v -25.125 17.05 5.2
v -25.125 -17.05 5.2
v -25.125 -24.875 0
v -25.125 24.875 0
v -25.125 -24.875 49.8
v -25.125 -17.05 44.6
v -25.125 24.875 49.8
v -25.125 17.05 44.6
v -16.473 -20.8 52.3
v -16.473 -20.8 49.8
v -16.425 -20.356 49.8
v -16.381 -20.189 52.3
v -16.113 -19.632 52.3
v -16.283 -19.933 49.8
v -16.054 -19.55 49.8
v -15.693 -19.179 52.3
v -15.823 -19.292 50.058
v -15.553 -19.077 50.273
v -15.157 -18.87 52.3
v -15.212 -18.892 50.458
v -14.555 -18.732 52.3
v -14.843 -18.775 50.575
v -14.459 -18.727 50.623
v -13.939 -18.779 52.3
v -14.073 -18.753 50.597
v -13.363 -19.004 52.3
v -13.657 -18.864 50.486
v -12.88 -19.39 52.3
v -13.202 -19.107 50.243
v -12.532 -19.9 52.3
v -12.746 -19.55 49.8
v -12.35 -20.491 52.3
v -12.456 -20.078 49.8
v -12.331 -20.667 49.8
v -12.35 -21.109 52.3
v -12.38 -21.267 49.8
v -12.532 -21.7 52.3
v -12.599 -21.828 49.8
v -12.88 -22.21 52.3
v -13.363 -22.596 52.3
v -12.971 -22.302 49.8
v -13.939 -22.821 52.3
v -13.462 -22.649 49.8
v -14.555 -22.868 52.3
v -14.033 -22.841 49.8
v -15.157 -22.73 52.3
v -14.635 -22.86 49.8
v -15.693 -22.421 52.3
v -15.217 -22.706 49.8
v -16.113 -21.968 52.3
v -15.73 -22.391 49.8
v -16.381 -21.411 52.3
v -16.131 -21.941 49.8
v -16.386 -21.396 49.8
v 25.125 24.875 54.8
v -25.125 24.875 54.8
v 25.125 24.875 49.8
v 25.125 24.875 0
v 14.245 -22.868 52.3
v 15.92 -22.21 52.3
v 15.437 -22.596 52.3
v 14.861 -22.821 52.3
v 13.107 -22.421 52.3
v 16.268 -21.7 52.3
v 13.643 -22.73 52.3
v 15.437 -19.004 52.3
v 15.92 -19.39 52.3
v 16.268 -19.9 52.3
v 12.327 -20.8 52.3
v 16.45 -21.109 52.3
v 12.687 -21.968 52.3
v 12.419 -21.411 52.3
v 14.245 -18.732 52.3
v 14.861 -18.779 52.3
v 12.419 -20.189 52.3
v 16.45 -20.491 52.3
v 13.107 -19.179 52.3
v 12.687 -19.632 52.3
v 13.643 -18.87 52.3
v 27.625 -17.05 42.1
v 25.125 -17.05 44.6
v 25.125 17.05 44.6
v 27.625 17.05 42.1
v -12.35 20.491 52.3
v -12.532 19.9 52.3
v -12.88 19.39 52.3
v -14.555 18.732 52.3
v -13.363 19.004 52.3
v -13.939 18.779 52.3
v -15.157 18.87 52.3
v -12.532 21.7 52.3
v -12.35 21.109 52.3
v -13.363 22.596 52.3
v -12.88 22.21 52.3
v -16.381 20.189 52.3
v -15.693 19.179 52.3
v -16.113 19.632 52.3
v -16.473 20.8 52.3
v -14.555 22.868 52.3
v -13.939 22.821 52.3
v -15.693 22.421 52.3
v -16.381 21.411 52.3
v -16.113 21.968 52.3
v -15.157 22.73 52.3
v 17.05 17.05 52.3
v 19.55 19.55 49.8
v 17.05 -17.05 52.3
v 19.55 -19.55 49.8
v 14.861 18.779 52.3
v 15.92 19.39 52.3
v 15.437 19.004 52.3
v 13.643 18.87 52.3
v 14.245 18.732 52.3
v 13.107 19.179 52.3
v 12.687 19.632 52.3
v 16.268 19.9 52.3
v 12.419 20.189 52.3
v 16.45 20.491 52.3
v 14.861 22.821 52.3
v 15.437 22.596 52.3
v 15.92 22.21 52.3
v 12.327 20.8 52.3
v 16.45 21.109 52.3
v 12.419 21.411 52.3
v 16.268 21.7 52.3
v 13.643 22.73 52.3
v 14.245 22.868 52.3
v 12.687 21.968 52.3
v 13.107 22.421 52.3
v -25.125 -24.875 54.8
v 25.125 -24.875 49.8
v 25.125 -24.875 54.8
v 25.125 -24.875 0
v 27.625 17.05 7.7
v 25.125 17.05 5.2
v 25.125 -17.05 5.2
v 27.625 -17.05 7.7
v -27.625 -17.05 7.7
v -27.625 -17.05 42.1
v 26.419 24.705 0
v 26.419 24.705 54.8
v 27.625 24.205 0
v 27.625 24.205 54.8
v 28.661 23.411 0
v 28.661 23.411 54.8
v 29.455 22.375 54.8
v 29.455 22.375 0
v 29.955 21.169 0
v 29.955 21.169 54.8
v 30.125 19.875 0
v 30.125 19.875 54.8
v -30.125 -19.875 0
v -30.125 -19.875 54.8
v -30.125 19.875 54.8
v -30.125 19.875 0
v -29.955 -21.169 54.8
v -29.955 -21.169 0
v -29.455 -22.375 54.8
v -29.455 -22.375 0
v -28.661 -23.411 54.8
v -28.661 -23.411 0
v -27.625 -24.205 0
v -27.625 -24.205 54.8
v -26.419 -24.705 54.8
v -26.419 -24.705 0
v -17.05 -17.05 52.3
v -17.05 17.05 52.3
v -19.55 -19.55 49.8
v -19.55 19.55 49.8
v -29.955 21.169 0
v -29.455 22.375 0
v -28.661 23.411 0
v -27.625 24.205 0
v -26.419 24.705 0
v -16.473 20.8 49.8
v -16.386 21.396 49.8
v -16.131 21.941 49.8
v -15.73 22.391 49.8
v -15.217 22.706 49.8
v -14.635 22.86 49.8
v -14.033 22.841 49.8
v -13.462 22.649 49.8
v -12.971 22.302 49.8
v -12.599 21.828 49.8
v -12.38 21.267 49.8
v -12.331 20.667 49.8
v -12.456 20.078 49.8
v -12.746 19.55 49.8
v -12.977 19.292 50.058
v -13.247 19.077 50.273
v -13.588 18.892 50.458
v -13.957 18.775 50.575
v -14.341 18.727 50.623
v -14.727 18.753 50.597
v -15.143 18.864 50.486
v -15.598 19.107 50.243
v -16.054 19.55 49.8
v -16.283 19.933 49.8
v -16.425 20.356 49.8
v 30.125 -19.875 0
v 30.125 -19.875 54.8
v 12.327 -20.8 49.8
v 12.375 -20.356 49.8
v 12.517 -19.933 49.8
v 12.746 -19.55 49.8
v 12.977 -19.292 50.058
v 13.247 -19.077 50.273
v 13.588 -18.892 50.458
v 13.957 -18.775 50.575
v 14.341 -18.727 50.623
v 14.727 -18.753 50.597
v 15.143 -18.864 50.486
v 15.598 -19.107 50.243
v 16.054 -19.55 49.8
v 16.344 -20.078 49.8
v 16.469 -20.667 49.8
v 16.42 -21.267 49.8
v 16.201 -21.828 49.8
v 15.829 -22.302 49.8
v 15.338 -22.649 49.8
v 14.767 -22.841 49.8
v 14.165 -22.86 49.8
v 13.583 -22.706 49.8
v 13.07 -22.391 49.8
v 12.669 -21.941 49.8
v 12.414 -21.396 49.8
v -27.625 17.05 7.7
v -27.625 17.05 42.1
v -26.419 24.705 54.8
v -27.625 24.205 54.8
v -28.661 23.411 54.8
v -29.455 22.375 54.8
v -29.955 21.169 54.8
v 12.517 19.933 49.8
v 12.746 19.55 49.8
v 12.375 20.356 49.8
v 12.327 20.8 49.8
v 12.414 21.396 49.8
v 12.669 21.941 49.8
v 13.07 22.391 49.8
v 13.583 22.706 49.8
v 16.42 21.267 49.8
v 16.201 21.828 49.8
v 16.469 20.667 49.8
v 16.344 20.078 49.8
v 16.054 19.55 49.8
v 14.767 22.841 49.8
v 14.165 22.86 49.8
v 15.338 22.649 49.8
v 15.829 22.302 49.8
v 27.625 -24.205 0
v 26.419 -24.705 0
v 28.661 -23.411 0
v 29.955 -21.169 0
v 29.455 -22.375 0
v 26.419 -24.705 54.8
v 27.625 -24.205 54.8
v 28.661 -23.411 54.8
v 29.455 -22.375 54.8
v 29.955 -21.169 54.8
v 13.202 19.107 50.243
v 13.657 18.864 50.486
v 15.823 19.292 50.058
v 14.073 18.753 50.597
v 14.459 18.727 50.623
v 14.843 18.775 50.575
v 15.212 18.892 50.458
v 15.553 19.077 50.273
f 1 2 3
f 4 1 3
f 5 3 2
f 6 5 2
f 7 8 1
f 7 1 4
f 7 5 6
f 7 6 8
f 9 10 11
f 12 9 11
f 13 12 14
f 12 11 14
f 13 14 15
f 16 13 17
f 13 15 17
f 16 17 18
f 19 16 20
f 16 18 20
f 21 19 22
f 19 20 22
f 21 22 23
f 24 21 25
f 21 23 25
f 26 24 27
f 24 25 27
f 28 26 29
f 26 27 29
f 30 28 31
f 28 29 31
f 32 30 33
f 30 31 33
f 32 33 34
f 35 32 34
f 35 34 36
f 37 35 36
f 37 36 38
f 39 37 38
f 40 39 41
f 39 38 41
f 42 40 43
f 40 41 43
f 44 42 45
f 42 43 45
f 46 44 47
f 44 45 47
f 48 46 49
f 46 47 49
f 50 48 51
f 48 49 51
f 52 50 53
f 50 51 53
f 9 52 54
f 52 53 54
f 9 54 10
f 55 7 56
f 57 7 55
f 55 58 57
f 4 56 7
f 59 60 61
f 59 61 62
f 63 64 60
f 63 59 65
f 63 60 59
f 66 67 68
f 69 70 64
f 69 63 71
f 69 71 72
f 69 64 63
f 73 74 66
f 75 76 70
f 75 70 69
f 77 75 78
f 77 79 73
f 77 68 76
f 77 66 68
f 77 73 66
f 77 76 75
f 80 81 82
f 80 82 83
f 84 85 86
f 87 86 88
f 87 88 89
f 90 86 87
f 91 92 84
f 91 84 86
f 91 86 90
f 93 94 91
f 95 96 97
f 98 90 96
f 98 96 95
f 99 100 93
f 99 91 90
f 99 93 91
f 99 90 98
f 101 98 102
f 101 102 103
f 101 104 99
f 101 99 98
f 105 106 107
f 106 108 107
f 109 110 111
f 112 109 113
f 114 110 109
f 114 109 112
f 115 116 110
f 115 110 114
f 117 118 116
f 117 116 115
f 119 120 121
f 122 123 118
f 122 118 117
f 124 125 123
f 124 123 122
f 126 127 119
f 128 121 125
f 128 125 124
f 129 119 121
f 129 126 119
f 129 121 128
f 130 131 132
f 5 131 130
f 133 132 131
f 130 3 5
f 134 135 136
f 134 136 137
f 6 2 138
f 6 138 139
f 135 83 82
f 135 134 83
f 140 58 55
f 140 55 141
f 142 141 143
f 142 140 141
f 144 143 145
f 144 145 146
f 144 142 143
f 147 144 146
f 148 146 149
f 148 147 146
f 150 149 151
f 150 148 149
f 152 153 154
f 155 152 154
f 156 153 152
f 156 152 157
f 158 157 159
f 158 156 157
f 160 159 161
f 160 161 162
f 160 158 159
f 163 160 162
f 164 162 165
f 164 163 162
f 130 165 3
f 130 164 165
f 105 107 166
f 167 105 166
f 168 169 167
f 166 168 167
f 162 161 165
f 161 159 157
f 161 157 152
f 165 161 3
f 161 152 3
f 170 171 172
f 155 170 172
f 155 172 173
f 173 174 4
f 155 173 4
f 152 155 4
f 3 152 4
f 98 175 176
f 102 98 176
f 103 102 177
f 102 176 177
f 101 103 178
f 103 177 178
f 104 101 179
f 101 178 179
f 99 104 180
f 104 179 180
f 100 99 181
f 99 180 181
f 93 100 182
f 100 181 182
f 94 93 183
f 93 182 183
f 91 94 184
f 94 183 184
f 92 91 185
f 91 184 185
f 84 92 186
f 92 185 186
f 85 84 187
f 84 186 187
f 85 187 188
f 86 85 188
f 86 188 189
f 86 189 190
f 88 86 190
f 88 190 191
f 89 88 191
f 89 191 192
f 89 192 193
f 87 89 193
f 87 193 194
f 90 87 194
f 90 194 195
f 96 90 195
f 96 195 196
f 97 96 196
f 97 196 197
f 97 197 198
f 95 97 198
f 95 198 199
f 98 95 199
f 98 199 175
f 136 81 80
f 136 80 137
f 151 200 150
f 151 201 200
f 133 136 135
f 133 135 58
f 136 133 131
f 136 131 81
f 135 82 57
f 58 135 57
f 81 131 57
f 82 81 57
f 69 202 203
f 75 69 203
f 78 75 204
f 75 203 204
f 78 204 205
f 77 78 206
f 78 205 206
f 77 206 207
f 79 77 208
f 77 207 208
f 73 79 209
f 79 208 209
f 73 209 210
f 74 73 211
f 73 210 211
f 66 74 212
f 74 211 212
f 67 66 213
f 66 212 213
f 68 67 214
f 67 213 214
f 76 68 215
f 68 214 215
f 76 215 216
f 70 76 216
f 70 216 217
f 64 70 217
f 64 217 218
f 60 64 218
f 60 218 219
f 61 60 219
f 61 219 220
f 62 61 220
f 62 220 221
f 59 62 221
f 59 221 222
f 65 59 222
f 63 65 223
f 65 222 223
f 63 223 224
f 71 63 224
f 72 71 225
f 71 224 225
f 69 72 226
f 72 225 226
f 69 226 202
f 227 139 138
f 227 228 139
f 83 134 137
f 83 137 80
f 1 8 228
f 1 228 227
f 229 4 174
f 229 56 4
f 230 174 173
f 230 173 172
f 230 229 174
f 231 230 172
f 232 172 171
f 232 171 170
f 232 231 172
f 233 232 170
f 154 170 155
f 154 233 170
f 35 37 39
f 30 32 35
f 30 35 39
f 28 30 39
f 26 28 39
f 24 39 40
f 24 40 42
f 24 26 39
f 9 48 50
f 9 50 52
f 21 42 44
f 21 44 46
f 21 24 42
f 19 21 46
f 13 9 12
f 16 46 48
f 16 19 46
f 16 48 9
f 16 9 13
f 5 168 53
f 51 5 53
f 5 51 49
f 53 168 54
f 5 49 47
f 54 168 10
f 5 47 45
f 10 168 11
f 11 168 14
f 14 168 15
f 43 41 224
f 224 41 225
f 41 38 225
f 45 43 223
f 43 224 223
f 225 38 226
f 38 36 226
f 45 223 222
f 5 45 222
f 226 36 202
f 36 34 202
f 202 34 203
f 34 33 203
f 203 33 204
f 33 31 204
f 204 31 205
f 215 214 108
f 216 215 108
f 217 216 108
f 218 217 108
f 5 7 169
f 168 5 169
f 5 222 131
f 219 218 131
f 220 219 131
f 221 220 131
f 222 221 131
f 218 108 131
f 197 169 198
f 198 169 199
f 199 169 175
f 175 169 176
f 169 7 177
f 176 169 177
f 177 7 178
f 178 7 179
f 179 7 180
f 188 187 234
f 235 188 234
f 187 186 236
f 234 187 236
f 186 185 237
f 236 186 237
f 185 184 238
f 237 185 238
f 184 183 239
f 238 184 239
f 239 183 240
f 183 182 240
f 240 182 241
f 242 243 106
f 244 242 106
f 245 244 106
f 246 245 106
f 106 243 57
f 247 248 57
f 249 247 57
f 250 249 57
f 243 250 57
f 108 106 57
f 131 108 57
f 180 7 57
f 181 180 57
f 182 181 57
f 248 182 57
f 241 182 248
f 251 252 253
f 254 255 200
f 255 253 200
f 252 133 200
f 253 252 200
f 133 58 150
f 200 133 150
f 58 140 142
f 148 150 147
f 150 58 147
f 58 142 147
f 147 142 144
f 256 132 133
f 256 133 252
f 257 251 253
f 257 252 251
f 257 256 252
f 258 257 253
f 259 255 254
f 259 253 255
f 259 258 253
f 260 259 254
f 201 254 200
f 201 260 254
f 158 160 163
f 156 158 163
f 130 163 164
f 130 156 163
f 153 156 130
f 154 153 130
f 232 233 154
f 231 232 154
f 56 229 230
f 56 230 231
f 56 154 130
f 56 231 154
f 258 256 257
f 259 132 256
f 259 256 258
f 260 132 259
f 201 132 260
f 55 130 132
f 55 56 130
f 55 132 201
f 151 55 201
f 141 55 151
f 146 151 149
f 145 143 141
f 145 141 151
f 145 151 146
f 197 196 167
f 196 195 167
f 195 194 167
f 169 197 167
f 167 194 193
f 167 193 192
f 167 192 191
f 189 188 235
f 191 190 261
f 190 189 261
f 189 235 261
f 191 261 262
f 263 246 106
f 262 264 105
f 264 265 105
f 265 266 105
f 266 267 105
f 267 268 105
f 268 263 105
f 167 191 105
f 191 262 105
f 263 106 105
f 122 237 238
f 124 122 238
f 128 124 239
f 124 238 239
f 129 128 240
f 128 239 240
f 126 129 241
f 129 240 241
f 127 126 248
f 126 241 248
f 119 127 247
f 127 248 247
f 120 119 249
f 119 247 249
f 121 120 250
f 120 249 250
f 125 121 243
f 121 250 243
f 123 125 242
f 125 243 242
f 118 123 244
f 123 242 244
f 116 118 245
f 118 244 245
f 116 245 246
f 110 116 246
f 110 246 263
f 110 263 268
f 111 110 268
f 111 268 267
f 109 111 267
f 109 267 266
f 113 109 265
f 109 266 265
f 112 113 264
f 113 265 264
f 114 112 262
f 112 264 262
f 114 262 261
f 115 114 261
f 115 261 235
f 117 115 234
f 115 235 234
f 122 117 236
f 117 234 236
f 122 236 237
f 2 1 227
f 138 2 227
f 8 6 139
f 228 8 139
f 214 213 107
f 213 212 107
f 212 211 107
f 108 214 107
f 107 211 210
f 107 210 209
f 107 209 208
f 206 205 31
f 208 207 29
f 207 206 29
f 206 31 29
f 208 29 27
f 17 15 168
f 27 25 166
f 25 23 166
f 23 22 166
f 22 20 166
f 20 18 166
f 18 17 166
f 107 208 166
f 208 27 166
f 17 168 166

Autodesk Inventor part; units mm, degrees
ref_plane "YZ Plane" through (0, 0, 0) normal (1, 0, 0) x (0, 1, 0)
sketch "Sketch1" plane through (0, 0, 0) normal (0, 0, 1) x (1, 0, 0)
  circle A0 centre (-21.9, -21.9) radius 1.875 projected
  circle A1 centre (21.9, 21.9) radius 1.875 projected
  circle A2 centre (21.9, -21.9) radius 1.875 projected
  circle A3 centre (-21.9, 21.9) radius 1.875 projected
  circle A4 centre (14.4, 20.8) radius 2.0734 projected
  circle A5 centre (-14.4, -20.8) radius 2.0734 projected
  circle A6 centre (14.4, -20.8) radius 2.0734 projected
  circle A7 centre (20.8, -14.4) radius 2.0734 projected
  line L0 (-17.05, 17.05) -> (-17.05, -17.05) projected
  line L1 (17.05, 17.05) -> (-17.05, 17.05) projected
  line L2 (17.05, -17.05) -> (17.05, 17.05) projected
  line L3 (-17.05, -17.05) -> (17.05, -17.05) projected
  circle A8 centre (20.8, 14.4) radius 2.0734 projected
  circle A9 centre (-14.4, 20.8) radius 2.0734 projected
  circle A10 centre (-20.8, -14.4) radius 2.0734 projected
  circle A11 centre (-20.8, 14.4) radius 2.0734 projected
  line L4 (-22.9, 24.875) -> (22.9, 24.875) projected
  arc A12 (-22.9, 24.875) -> (-24.875, 22.9) centre (-22.9, 22.9) ccw projected
  line L5 (-24.875, -22.9) -> (-24.875, 22.9) projected
  arc A13 (-24.875, -22.9) -> (-22.9, -24.875) centre (-22.9, -22.9) ccw projected
  line L6 (22.9, -24.875) -> (-22.9, -24.875) projected
  arc A14 (22.9, -24.875) -> (24.875, -22.9) centre (22.9, -22.9) ccw projected
  line L7 (24.875, 22.9) -> (24.875, -22.9) projected
  arc A15 (24.875, 22.9) -> (22.9, 24.875) centre (22.9, 22.9) ccw projected
  line L8 (-24.875, 24.875) -> (24.875, 24.875)
  line L9 (24.875, 24.875) -> (24.875, -24.875)
  line L10 (24.875, -24.875) -> (-24.875, -24.875)
  line L11 (-24.875, -24.875) -> (-24.875, 24.875)
  line L12 (-24.875, 24.875) -> (24.875, -24.875) construction
  line L13 (24.875, 24.875) -> (-24.875, -24.875) construction
  point P0 (0, 0)
ref_plane "Work Plane1" through (-24.875, -24.875, 49.8) normal (0, 0, 1) x (1, 0, 0)
extrude "Extrusion1" add sketch "Sketch1" along normal blind 5 from surface at 49.8 contours A0 | A1 | A2 | A3 | A4 | A5 | A6 | A7 | L1 L2 L3 L0 | A8 | A9 | A10 | A11 | L4 A15 L7 A14 L6 A13 L5 A12 | A12 L11 L8 | L8 L9 A15 | A13 L10 L11 | L9 L10 A14
sketch "Sketch2" plane through (-24.875, 24.875, 54.8) normal (0, 0, 1) x (1, 0, 0)
  line L0 (49.75, 0) -> (49.75, -49.75) projected
  line L1 (0, 0) -> (49.75, 0) projected
  line L2 (0, -49.75) -> (0, 0) projected
  line L3 (49.75, -49.75) -> (0, -49.75) projected
  line L4 (49.75, -49.75) -> (50, -49.75)
  line L5 (50, -49.75) -> (50, 0)
  line L6 (50, 0) -> (49.75, 0)
  line L7 (49.75, 0) -> (49.75, -49.75)
  line L8 (50, -49.75) -> (55, -49.75)
  line L9 (55, -49.75) -> (55, 0)
  line L10 (55, 0) -> (50, 0)
  line L11 (50, 0) -> (50, -49.75)
  line L12 (24.875, -49.75) -> (24.875, 0)
  line L13 (0, 0) -> (0, -49.75)
  line L14 (0, -49.75) -> (-0.25, -49.75)
  line L15 (-0.25, -49.75) -> (-0.25, 0)
  line L16 (-0.25, 0) -> (0, 0)
  line L17 (0, 0) -> (0, -49.75)
  line L18 (-0.25, -49.75) -> (-5.25, -49.75)
  line L19 (-5.25, -49.75) -> (-5.25, 0)
  line L20 (-5.25, 0) -> (-0.25, 0)
  line L21 (-0.25, 0) -> (-0.25, -49.75)
  point P0 (24.875, -24.875)
  point P1 (-0.25, 0)
  point P2 (50, 0)
  point P3 (50, 0)
  point P4 (-0.25, 0)
  dimension "d2" = 0.25
  dimension "d3" = 49.75
  dimension "d4" = 5
  dimension "d5" = 49.75
extrude "Extrusion2" add sketch "Sketch2" against normal blind 5 contours L6 L5 L4 L0 | L10 L9 L8 L5 | L2 L14 L15 L16 | L15 L18 L19 L20
ref_plane "Work Plane2" through (-24.875, -24.875, 0) normal (0, 0, -1) x (0, 1, 0)
extrude "Extrusion3" add sketch "Sketch2" against normal up to surface (54.8 mm away) contours L10 L9 L8 L5 | L15 L18 L19 L20
sketch "Sketch3" plane through (25.125, -24.875, 49.8) normal (-1, 0, 0) x (0, 0, 1)
  line L0 (-7.7, 7.825) -> (-42.1, 7.825) projected
  line L1 (-42.1, 41.925) -> (-7.7, 41.925) projected
  line L2 (-24.9, 7.825) -> (-24.9, 41.925)
  line L3 (-42.1, 7.825) -> (-7.7, 7.825)
  line L4 (-7.7, 7.825) -> (-7.7, 41.925)
  line L5 (-7.7, 41.925) -> (-42.1, 41.925)
  line L6 (-42.1, 41.925) -> (-42.1, 7.825)
  line L7 (-42.1, 7.825) -> (-7.7, 41.925) construction
  line L8 (-7.7, 7.825) -> (-42.1, 41.925) construction
  point P0 (-49.8, 24.875)
  point P1 (-24.9, 24.875)
extrude "Extrusion4" cut sketch "Sketch3" against normal blind 2.5
mirror "Mirror1" about plane through (0, 0, 0) normal (1, 0, 0) of "Extrusion4"
sketch "Sketch4" plane through (25.125, -24.875, 49.8) normal (0, 0, -1) x (-1, 0, 0)
  circle A0 centre (47.025, 2.975) radius 1.875 projected
  circle A1 centre (3.225, 46.775) radius 1.875 projected
  circle A2 centre (3.225, 2.975) radius 1.875 projected
  circle A3 centre (47.025, 46.775) radius 1.875 projected
  circle A4 centre (10.725, 45.675) radius 2.0734 projected
  circle A5 centre (39.525, 4.075) radius 2.0734 projected
  circle A6 centre (10.725, 4.075) radius 2.0734 projected
  circle A7 centre (4.325, 10.475) radius 2.0734 projected
  line L0 (42.175, 41.925) -> (42.175, 7.825) projected
  line L1 (8.075, 41.925) -> (42.175, 41.925) projected
  line L2 (8.075, 7.825) -> (8.075, 41.925) projected
  line L3 (42.175, 7.825) -> (8.075, 7.825) projected
  circle A8 centre (4.325, 39.275) radius 2.0734 projected
  circle A9 centre (39.525, 45.675) radius 2.0734 projected
  circle A10 centre (45.925, 10.475) radius 2.0734 projected
  circle A11 centre (45.925, 39.275) radius 2.0734 projected
  line L4 (48.025, 49.75) -> (2.225, 49.75) projected
  arc A12 (50, 47.775) -> (48.025, 49.75) centre (48.025, 47.775) ccw projected
  line L5 (50, 1.975) -> (50, 47.775) projected
  arc A13 (48.025, 0) -> (50, 1.975) centre (48.025, 1.975) ccw projected
  line L6 (2.225, 0) -> (48.025, 0) projected
  arc A14 (0.25, 1.975) -> (2.225, 0) centre (2.225, 1.975) ccw projected
  line L7 (0.25, 47.775) -> (0.25, 1.975) projected
  arc A15 (2.225, 49.75) -> (0.25, 47.775) centre (2.225, 47.775) ccw projected
  point P0 (25.125, 24.875)
extrude "Extrusion5" cut sketch "Sketch4" against normal blind 2.5 contours A4 | A5 | A6 | L0 L3 L2 L1 | A9
chamfer "Chamfer1" distance 2.5 angle 45 8 edges at (-25.125, 0, 42.1) (-25.125, 0, 7.7) (25.125, 0, 42.1) (25.125, 0, 7.7) (0, 17.05, 49.8) (17.05, 0, 49.8) (-17.05, 0, 49.8) (0, -17.05, 49.8)
fillet "Fillet1" radius 5 4 edges at (30.125, -24.875, 27.4) (-30.125, -24.875, 27.4) (-30.125, 24.875, 27.4) (30.125, 24.875, 27.4)
properties part number "Cover Top (Full)"
